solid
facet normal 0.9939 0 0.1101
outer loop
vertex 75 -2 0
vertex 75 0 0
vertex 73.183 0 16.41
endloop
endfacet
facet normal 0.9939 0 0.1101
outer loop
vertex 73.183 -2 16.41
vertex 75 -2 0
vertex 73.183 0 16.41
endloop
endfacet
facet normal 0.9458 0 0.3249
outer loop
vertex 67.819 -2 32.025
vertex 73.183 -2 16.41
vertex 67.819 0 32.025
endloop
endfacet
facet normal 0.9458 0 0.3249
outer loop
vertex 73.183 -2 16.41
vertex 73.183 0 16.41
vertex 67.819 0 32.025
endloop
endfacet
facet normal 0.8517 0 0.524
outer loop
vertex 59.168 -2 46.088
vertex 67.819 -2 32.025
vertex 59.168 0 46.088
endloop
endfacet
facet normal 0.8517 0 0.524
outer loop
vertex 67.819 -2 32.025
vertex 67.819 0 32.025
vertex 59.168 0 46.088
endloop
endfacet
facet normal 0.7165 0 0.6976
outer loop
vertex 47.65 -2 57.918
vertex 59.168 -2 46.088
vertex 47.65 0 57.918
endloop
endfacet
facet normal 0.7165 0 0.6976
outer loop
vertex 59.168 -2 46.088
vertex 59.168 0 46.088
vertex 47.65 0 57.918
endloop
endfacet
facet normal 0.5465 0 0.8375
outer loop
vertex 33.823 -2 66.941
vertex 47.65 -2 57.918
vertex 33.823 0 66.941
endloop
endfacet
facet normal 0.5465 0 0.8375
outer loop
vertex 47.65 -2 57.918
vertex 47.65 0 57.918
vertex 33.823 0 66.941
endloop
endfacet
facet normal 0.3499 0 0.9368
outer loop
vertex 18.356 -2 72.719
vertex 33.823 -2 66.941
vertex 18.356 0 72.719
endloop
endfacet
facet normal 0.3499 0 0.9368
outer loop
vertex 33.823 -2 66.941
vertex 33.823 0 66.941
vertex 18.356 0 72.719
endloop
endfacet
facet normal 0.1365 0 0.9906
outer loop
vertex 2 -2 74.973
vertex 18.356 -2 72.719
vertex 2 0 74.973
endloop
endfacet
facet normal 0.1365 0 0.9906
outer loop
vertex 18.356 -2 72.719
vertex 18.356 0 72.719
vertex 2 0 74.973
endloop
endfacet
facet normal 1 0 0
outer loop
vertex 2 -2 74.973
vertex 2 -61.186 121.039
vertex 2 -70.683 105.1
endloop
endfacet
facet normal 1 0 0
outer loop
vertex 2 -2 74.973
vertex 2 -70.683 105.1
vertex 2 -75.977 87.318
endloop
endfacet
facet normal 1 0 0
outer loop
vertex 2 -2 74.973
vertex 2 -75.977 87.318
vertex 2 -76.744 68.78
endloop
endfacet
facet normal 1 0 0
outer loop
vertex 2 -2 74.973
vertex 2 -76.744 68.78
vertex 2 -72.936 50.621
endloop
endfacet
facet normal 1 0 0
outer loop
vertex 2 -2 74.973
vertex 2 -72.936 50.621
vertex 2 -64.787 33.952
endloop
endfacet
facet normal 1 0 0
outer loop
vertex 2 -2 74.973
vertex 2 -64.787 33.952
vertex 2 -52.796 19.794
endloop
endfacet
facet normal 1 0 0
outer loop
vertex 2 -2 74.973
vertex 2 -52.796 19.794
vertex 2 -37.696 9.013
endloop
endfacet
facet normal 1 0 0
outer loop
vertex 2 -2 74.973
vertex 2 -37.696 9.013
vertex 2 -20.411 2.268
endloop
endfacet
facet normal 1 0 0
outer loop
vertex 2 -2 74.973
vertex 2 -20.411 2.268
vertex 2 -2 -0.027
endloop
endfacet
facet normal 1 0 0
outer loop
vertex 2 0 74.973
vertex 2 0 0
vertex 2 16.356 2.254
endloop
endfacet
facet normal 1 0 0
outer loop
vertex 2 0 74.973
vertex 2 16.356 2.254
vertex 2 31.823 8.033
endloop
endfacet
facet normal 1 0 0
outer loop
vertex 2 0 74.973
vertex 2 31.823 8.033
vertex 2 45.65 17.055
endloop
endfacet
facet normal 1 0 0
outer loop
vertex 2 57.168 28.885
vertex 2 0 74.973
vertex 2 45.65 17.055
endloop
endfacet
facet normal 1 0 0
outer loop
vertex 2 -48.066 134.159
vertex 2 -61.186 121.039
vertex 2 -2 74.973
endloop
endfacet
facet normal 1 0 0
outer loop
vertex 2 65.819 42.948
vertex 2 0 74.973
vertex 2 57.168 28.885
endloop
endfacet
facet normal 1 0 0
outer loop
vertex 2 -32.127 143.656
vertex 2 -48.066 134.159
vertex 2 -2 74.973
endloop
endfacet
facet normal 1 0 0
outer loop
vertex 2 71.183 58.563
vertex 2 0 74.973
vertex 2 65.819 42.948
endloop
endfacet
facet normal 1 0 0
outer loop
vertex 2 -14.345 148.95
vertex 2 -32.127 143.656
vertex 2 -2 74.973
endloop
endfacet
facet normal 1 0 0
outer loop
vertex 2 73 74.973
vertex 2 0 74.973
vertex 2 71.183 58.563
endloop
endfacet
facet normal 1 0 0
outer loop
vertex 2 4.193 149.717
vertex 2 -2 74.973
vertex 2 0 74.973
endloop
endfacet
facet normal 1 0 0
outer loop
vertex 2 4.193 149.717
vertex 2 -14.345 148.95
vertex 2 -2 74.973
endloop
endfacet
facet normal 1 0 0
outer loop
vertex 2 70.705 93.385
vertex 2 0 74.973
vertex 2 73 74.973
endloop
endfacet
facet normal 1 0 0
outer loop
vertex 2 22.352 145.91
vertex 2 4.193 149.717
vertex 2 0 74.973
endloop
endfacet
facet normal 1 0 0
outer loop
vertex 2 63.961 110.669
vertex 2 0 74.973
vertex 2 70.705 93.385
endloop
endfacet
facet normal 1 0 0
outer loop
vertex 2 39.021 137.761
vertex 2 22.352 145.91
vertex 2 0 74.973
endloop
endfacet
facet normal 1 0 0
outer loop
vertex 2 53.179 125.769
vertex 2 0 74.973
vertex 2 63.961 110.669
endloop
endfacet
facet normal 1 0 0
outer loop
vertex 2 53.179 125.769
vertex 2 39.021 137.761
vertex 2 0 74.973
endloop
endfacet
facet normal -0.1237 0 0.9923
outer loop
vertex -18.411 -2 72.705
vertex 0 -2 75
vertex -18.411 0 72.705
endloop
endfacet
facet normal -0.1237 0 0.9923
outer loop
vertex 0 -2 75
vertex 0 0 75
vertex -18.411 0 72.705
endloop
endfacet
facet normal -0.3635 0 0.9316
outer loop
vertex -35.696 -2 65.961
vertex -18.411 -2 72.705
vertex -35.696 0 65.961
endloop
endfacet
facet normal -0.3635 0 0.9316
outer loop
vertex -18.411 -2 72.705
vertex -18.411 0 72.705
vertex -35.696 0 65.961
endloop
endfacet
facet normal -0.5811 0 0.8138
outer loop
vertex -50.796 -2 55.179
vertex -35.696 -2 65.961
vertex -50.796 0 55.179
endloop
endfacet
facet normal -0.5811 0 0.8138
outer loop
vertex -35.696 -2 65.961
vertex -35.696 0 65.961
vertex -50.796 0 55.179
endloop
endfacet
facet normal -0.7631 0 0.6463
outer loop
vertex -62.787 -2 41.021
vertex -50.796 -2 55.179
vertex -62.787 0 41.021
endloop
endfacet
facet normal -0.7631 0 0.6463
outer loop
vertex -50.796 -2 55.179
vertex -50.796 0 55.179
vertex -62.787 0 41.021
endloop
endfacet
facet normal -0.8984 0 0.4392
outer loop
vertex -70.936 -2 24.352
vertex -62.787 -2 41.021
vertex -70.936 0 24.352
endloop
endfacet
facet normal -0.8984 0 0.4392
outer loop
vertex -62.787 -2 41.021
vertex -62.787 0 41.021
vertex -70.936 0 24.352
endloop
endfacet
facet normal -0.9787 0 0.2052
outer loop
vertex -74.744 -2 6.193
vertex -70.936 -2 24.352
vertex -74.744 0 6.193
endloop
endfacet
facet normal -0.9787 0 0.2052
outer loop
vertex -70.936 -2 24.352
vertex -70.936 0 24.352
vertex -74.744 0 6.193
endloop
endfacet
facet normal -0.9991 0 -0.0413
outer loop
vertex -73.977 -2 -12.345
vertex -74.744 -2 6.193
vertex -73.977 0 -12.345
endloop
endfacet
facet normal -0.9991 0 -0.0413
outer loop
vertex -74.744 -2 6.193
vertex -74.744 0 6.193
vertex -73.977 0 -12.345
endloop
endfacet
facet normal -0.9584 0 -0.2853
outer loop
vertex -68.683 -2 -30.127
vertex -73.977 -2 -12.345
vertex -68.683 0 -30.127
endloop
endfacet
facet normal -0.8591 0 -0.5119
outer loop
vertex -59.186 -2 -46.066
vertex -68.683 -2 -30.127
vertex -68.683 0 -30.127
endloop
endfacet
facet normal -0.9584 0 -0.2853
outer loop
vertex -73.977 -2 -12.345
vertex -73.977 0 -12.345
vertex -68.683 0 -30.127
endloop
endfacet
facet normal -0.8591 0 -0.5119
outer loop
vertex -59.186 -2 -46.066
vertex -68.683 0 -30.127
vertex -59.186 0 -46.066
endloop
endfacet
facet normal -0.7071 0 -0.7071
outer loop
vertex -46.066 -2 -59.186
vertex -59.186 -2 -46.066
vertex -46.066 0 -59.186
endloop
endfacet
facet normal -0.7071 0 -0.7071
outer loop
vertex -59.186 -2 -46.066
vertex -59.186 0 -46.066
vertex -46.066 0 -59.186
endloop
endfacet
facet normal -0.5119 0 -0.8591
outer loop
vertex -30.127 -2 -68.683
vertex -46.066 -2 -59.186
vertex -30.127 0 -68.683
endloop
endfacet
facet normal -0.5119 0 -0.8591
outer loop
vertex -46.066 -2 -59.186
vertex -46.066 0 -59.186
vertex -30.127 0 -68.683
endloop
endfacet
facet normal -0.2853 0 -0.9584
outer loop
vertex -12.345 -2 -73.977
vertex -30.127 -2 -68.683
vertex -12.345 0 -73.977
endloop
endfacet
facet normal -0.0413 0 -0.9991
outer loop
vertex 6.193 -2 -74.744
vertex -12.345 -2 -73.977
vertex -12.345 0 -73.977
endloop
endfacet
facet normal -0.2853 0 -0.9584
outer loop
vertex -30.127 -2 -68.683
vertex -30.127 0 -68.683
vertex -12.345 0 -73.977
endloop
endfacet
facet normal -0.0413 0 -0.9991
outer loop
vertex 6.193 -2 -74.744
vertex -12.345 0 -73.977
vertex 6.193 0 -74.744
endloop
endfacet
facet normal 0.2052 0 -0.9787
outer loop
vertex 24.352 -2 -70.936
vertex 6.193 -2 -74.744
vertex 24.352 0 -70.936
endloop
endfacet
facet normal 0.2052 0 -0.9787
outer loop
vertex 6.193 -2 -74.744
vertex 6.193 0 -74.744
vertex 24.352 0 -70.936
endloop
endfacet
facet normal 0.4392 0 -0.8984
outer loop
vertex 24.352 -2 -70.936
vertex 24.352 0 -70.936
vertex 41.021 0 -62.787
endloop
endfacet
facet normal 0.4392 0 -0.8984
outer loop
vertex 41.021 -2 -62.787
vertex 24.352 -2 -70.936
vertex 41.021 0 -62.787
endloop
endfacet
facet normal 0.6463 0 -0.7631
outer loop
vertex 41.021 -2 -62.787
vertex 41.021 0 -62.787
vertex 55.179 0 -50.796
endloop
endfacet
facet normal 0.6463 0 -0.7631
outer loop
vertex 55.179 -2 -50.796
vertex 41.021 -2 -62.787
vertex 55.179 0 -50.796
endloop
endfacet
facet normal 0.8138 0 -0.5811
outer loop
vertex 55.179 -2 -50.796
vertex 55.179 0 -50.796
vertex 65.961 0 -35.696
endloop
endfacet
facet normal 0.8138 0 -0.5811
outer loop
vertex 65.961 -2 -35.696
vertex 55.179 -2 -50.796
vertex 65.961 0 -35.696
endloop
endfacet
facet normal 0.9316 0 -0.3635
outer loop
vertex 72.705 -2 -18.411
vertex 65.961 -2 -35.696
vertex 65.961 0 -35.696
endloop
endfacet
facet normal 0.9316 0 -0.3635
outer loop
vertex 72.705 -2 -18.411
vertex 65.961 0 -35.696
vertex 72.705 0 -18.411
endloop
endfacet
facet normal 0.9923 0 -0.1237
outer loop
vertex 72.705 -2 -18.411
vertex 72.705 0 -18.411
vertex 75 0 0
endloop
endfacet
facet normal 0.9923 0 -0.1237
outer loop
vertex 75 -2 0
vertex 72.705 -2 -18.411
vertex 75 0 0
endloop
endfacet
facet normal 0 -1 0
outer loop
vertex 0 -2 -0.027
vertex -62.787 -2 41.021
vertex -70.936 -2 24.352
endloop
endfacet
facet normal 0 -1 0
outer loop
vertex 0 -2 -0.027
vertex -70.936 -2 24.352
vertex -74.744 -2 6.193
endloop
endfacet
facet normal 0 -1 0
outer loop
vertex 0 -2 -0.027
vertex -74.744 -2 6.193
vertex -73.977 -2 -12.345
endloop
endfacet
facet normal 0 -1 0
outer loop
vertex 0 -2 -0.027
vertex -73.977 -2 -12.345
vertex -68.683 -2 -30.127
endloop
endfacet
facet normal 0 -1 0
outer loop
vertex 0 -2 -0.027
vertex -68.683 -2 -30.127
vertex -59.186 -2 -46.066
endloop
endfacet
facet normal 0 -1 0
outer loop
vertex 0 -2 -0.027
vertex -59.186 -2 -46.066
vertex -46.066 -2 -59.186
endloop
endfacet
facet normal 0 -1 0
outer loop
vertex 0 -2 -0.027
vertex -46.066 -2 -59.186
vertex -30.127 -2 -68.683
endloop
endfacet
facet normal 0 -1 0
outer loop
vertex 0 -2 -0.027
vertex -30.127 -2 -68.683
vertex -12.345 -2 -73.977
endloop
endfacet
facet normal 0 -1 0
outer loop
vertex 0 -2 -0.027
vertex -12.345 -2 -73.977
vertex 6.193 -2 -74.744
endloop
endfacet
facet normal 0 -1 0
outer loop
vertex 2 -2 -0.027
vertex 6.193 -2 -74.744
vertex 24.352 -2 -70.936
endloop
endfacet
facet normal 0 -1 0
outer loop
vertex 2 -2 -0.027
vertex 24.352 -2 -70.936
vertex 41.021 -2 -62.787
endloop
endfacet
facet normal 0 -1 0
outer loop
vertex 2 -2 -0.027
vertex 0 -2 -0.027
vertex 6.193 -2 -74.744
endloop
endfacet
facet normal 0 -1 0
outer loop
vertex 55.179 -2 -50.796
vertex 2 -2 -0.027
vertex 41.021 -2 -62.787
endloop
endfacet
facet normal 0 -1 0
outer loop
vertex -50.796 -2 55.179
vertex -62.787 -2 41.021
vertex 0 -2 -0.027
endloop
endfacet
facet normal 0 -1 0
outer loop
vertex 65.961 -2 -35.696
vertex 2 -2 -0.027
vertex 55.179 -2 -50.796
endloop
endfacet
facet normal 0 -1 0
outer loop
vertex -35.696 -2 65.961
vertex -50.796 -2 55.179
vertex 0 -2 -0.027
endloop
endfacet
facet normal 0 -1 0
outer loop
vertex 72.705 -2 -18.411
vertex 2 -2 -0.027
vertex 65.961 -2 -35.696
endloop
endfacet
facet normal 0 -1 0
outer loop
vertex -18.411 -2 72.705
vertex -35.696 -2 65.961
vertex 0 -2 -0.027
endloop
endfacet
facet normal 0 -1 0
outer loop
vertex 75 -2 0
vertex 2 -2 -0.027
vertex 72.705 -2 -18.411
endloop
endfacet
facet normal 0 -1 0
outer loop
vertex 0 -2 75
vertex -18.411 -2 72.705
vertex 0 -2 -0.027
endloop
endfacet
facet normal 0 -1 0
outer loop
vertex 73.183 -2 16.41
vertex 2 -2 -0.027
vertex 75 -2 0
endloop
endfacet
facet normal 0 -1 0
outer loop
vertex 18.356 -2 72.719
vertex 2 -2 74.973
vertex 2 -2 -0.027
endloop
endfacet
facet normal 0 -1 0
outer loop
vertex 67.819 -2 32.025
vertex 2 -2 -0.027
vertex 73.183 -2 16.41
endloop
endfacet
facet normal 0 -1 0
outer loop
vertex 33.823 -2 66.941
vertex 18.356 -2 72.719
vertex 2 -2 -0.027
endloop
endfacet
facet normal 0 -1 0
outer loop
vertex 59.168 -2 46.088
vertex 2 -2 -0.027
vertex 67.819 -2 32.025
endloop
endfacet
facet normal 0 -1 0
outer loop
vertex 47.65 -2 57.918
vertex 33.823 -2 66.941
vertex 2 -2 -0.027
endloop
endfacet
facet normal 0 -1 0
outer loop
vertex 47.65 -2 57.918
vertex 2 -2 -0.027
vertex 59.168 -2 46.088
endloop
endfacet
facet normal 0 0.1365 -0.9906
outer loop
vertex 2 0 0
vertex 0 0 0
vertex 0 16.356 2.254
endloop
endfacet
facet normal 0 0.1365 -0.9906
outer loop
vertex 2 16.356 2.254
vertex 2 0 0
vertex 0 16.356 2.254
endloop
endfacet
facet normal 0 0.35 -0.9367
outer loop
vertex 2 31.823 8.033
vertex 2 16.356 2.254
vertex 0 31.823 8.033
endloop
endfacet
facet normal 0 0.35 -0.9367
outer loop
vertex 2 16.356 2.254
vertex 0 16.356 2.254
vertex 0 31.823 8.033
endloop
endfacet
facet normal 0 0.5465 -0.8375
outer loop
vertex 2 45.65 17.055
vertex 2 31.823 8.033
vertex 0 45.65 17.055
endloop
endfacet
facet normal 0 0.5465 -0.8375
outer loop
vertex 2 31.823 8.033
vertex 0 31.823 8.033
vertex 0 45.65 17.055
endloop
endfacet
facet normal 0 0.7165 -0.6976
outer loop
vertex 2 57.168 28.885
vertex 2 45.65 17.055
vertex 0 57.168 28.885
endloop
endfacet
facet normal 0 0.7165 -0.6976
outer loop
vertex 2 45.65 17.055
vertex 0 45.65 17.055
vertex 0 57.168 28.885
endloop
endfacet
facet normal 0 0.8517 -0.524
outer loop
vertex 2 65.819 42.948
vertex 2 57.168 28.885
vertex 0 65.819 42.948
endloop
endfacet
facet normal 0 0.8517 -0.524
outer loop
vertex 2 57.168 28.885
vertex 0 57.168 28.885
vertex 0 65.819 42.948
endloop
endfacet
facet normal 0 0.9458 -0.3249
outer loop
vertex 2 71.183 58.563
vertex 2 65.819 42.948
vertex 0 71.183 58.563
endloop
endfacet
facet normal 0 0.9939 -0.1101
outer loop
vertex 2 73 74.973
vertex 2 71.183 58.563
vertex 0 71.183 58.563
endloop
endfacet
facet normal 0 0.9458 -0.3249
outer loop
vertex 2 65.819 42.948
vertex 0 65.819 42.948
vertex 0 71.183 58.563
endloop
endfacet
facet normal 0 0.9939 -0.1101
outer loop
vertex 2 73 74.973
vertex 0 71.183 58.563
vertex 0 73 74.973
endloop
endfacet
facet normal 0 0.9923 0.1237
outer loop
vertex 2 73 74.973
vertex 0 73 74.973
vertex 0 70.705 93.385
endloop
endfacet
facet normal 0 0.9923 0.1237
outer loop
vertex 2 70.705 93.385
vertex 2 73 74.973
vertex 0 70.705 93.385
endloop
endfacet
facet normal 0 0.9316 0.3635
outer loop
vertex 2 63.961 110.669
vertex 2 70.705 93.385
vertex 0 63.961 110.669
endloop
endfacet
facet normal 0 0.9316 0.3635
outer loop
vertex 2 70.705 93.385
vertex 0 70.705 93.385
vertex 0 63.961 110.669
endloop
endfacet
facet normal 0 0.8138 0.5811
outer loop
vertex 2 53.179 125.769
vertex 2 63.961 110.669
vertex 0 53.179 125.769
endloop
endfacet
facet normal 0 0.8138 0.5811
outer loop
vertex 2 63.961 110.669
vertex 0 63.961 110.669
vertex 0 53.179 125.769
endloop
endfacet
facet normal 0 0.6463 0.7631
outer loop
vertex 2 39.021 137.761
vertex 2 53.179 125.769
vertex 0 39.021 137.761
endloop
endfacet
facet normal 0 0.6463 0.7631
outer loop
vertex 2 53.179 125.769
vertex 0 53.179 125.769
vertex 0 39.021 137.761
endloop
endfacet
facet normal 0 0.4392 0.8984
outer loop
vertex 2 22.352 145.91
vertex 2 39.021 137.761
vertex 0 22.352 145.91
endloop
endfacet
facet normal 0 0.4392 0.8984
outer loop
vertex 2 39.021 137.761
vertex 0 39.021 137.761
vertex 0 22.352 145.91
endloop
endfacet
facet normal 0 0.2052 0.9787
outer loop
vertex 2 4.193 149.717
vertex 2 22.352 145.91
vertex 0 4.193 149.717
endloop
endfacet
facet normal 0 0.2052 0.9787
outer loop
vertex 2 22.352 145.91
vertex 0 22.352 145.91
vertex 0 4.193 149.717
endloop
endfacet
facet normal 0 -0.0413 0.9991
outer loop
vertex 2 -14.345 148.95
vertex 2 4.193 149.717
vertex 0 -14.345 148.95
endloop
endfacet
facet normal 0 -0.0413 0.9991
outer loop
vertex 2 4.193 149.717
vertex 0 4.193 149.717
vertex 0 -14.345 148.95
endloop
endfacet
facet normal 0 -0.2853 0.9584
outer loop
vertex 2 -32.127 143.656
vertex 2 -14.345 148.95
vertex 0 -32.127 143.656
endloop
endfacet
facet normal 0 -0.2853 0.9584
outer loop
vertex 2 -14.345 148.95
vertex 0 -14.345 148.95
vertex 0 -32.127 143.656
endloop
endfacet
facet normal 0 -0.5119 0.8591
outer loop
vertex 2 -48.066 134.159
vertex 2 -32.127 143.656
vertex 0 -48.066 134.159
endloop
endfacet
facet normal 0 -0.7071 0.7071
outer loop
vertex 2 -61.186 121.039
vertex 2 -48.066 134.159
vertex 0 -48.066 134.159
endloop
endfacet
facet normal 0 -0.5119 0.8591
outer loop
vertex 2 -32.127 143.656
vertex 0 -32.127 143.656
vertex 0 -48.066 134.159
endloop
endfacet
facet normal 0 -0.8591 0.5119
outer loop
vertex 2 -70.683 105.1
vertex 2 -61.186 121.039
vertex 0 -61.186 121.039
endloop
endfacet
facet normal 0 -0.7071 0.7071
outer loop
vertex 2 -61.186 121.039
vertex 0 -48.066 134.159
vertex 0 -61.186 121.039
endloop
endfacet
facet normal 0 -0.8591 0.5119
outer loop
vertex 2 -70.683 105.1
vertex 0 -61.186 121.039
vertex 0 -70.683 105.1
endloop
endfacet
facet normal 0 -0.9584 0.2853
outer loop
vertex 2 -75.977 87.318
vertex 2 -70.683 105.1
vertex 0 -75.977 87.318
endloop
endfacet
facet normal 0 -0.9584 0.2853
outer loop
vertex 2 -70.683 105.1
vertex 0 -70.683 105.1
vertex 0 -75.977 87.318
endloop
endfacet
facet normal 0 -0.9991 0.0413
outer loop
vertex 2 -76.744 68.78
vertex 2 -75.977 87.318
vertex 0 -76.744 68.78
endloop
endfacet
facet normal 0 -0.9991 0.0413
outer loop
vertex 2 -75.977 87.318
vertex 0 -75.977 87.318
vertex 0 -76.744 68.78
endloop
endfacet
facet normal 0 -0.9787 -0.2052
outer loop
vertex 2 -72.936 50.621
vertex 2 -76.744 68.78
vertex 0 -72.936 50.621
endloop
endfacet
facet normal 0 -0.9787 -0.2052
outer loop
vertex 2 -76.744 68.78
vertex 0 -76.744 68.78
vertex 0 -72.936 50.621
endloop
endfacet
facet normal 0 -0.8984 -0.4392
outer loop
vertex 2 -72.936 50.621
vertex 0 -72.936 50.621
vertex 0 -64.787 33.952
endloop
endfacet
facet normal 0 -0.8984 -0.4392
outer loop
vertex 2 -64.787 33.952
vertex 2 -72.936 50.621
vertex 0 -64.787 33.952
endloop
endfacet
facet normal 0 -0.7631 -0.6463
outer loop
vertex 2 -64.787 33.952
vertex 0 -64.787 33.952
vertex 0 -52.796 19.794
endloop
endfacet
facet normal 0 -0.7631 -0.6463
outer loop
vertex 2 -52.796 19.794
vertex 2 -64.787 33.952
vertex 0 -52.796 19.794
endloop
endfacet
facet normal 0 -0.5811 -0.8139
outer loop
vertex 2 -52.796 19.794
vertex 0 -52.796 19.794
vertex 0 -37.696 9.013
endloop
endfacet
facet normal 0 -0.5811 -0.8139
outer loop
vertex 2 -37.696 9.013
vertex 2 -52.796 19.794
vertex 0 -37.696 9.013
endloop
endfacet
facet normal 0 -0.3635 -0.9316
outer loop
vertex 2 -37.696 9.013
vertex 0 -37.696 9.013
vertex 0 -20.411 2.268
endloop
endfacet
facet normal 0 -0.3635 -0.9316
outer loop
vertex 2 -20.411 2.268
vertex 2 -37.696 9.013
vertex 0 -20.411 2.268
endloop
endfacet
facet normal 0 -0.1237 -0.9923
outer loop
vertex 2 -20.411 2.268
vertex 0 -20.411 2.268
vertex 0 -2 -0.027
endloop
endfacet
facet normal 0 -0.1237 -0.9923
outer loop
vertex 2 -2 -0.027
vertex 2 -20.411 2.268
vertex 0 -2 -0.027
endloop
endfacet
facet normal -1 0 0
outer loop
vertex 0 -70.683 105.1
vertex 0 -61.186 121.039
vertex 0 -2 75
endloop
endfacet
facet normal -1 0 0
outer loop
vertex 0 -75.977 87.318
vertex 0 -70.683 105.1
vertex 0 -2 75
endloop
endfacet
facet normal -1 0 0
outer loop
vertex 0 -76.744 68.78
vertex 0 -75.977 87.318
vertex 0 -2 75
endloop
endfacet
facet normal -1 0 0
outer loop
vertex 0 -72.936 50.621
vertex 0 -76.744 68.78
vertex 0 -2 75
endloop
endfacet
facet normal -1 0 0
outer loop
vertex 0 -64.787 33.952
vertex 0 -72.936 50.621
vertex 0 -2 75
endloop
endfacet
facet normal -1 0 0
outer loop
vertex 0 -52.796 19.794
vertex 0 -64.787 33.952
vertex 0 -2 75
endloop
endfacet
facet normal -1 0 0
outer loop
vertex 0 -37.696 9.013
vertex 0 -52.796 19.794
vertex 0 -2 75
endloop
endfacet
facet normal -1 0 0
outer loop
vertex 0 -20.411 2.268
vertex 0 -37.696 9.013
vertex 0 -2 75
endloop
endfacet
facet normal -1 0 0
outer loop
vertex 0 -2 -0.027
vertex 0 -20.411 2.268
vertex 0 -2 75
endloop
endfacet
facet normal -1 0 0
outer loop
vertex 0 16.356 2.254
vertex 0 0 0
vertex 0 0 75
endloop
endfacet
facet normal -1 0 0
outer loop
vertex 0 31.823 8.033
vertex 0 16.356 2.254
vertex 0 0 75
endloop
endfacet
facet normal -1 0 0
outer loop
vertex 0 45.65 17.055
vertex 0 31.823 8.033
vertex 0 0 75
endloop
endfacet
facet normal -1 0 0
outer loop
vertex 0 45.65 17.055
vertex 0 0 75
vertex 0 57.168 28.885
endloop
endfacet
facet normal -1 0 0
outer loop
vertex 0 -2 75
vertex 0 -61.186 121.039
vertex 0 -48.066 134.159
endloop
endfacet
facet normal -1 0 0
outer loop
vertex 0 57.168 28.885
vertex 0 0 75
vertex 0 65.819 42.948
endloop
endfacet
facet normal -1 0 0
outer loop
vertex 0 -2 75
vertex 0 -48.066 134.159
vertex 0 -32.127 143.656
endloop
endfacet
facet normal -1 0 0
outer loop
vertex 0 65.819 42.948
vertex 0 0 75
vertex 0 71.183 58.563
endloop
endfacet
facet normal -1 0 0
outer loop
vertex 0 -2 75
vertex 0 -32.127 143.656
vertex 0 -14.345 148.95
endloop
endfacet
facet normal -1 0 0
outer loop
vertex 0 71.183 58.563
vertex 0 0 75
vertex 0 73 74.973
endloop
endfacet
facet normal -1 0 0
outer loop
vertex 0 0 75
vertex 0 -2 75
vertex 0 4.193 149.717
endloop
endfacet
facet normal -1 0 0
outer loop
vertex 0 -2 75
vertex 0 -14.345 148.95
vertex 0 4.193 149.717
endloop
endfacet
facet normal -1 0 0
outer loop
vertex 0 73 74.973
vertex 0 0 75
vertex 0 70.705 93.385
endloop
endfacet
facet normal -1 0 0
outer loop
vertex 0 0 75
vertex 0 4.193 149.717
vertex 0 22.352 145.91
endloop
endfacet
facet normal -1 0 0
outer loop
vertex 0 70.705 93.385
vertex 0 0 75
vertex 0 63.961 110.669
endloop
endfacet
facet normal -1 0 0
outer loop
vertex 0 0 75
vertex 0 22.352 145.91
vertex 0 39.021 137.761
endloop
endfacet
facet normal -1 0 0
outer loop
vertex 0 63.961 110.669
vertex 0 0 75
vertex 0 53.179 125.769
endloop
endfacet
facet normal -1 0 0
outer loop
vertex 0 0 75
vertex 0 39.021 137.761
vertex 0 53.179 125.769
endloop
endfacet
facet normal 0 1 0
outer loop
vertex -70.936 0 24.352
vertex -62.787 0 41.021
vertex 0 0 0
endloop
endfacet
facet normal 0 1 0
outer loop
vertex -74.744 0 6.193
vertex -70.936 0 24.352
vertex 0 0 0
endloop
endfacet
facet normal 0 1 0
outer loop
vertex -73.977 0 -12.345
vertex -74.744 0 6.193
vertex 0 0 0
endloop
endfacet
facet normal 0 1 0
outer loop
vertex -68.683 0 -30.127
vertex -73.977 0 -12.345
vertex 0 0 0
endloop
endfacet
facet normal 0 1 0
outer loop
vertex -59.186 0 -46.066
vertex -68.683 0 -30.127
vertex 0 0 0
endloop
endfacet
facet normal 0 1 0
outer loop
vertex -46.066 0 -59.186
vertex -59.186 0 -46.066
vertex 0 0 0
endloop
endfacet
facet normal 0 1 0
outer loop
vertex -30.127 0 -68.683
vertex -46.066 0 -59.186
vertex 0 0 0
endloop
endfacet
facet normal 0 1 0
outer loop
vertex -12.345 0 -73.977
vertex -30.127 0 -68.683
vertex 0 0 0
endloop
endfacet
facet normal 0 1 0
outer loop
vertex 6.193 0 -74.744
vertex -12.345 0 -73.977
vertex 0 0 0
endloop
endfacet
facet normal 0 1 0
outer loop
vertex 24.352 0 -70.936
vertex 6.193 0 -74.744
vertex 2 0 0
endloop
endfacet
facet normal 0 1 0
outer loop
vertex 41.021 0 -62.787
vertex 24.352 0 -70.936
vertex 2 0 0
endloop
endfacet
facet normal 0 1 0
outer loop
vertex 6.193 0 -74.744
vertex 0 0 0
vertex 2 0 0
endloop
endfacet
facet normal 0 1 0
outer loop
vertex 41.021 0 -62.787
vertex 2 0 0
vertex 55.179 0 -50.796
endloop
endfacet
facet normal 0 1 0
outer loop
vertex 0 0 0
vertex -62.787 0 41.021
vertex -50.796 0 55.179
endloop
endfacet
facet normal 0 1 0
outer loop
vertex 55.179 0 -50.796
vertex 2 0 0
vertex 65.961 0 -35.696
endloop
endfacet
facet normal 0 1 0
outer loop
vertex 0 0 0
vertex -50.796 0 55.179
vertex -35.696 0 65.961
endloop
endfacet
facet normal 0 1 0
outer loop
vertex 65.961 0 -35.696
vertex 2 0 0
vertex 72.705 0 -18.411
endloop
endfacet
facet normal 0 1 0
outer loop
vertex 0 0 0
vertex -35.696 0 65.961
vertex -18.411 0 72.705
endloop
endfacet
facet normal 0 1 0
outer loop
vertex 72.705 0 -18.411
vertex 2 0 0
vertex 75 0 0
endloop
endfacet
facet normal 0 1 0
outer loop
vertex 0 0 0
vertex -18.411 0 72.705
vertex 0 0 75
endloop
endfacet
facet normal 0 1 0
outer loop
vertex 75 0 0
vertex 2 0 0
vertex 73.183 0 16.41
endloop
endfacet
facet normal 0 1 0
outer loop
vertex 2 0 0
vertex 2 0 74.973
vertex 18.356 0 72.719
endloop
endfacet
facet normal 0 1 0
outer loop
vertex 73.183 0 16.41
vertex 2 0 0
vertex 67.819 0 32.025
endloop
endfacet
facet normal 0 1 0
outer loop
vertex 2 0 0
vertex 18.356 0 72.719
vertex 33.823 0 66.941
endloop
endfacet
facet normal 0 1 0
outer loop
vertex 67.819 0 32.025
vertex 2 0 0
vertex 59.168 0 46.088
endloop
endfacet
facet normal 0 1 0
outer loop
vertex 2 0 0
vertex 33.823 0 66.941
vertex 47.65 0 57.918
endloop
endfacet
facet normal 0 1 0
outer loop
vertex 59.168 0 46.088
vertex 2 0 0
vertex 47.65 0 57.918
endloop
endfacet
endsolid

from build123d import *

# Parameters (mm, degrees)
F0_R     = 75
F1_DEPTH = 2
F2_R     = 75
F3_DEPTH = 2


with BuildPart() as f1:
    # F0 (on Front) → F1 (new body)
    with BuildSketch(Plane.XZ):
        Circle(F0_R)
    extrude(amount=F1_DEPTH)

    # F2 (on Right) → F3 (join)
    with BuildSketch(Plane.YZ):
        with Locations((-2, 74.973329)):
            Circle(F2_R)
    extrude(amount=F3_DEPTH)


solid = f1.part
